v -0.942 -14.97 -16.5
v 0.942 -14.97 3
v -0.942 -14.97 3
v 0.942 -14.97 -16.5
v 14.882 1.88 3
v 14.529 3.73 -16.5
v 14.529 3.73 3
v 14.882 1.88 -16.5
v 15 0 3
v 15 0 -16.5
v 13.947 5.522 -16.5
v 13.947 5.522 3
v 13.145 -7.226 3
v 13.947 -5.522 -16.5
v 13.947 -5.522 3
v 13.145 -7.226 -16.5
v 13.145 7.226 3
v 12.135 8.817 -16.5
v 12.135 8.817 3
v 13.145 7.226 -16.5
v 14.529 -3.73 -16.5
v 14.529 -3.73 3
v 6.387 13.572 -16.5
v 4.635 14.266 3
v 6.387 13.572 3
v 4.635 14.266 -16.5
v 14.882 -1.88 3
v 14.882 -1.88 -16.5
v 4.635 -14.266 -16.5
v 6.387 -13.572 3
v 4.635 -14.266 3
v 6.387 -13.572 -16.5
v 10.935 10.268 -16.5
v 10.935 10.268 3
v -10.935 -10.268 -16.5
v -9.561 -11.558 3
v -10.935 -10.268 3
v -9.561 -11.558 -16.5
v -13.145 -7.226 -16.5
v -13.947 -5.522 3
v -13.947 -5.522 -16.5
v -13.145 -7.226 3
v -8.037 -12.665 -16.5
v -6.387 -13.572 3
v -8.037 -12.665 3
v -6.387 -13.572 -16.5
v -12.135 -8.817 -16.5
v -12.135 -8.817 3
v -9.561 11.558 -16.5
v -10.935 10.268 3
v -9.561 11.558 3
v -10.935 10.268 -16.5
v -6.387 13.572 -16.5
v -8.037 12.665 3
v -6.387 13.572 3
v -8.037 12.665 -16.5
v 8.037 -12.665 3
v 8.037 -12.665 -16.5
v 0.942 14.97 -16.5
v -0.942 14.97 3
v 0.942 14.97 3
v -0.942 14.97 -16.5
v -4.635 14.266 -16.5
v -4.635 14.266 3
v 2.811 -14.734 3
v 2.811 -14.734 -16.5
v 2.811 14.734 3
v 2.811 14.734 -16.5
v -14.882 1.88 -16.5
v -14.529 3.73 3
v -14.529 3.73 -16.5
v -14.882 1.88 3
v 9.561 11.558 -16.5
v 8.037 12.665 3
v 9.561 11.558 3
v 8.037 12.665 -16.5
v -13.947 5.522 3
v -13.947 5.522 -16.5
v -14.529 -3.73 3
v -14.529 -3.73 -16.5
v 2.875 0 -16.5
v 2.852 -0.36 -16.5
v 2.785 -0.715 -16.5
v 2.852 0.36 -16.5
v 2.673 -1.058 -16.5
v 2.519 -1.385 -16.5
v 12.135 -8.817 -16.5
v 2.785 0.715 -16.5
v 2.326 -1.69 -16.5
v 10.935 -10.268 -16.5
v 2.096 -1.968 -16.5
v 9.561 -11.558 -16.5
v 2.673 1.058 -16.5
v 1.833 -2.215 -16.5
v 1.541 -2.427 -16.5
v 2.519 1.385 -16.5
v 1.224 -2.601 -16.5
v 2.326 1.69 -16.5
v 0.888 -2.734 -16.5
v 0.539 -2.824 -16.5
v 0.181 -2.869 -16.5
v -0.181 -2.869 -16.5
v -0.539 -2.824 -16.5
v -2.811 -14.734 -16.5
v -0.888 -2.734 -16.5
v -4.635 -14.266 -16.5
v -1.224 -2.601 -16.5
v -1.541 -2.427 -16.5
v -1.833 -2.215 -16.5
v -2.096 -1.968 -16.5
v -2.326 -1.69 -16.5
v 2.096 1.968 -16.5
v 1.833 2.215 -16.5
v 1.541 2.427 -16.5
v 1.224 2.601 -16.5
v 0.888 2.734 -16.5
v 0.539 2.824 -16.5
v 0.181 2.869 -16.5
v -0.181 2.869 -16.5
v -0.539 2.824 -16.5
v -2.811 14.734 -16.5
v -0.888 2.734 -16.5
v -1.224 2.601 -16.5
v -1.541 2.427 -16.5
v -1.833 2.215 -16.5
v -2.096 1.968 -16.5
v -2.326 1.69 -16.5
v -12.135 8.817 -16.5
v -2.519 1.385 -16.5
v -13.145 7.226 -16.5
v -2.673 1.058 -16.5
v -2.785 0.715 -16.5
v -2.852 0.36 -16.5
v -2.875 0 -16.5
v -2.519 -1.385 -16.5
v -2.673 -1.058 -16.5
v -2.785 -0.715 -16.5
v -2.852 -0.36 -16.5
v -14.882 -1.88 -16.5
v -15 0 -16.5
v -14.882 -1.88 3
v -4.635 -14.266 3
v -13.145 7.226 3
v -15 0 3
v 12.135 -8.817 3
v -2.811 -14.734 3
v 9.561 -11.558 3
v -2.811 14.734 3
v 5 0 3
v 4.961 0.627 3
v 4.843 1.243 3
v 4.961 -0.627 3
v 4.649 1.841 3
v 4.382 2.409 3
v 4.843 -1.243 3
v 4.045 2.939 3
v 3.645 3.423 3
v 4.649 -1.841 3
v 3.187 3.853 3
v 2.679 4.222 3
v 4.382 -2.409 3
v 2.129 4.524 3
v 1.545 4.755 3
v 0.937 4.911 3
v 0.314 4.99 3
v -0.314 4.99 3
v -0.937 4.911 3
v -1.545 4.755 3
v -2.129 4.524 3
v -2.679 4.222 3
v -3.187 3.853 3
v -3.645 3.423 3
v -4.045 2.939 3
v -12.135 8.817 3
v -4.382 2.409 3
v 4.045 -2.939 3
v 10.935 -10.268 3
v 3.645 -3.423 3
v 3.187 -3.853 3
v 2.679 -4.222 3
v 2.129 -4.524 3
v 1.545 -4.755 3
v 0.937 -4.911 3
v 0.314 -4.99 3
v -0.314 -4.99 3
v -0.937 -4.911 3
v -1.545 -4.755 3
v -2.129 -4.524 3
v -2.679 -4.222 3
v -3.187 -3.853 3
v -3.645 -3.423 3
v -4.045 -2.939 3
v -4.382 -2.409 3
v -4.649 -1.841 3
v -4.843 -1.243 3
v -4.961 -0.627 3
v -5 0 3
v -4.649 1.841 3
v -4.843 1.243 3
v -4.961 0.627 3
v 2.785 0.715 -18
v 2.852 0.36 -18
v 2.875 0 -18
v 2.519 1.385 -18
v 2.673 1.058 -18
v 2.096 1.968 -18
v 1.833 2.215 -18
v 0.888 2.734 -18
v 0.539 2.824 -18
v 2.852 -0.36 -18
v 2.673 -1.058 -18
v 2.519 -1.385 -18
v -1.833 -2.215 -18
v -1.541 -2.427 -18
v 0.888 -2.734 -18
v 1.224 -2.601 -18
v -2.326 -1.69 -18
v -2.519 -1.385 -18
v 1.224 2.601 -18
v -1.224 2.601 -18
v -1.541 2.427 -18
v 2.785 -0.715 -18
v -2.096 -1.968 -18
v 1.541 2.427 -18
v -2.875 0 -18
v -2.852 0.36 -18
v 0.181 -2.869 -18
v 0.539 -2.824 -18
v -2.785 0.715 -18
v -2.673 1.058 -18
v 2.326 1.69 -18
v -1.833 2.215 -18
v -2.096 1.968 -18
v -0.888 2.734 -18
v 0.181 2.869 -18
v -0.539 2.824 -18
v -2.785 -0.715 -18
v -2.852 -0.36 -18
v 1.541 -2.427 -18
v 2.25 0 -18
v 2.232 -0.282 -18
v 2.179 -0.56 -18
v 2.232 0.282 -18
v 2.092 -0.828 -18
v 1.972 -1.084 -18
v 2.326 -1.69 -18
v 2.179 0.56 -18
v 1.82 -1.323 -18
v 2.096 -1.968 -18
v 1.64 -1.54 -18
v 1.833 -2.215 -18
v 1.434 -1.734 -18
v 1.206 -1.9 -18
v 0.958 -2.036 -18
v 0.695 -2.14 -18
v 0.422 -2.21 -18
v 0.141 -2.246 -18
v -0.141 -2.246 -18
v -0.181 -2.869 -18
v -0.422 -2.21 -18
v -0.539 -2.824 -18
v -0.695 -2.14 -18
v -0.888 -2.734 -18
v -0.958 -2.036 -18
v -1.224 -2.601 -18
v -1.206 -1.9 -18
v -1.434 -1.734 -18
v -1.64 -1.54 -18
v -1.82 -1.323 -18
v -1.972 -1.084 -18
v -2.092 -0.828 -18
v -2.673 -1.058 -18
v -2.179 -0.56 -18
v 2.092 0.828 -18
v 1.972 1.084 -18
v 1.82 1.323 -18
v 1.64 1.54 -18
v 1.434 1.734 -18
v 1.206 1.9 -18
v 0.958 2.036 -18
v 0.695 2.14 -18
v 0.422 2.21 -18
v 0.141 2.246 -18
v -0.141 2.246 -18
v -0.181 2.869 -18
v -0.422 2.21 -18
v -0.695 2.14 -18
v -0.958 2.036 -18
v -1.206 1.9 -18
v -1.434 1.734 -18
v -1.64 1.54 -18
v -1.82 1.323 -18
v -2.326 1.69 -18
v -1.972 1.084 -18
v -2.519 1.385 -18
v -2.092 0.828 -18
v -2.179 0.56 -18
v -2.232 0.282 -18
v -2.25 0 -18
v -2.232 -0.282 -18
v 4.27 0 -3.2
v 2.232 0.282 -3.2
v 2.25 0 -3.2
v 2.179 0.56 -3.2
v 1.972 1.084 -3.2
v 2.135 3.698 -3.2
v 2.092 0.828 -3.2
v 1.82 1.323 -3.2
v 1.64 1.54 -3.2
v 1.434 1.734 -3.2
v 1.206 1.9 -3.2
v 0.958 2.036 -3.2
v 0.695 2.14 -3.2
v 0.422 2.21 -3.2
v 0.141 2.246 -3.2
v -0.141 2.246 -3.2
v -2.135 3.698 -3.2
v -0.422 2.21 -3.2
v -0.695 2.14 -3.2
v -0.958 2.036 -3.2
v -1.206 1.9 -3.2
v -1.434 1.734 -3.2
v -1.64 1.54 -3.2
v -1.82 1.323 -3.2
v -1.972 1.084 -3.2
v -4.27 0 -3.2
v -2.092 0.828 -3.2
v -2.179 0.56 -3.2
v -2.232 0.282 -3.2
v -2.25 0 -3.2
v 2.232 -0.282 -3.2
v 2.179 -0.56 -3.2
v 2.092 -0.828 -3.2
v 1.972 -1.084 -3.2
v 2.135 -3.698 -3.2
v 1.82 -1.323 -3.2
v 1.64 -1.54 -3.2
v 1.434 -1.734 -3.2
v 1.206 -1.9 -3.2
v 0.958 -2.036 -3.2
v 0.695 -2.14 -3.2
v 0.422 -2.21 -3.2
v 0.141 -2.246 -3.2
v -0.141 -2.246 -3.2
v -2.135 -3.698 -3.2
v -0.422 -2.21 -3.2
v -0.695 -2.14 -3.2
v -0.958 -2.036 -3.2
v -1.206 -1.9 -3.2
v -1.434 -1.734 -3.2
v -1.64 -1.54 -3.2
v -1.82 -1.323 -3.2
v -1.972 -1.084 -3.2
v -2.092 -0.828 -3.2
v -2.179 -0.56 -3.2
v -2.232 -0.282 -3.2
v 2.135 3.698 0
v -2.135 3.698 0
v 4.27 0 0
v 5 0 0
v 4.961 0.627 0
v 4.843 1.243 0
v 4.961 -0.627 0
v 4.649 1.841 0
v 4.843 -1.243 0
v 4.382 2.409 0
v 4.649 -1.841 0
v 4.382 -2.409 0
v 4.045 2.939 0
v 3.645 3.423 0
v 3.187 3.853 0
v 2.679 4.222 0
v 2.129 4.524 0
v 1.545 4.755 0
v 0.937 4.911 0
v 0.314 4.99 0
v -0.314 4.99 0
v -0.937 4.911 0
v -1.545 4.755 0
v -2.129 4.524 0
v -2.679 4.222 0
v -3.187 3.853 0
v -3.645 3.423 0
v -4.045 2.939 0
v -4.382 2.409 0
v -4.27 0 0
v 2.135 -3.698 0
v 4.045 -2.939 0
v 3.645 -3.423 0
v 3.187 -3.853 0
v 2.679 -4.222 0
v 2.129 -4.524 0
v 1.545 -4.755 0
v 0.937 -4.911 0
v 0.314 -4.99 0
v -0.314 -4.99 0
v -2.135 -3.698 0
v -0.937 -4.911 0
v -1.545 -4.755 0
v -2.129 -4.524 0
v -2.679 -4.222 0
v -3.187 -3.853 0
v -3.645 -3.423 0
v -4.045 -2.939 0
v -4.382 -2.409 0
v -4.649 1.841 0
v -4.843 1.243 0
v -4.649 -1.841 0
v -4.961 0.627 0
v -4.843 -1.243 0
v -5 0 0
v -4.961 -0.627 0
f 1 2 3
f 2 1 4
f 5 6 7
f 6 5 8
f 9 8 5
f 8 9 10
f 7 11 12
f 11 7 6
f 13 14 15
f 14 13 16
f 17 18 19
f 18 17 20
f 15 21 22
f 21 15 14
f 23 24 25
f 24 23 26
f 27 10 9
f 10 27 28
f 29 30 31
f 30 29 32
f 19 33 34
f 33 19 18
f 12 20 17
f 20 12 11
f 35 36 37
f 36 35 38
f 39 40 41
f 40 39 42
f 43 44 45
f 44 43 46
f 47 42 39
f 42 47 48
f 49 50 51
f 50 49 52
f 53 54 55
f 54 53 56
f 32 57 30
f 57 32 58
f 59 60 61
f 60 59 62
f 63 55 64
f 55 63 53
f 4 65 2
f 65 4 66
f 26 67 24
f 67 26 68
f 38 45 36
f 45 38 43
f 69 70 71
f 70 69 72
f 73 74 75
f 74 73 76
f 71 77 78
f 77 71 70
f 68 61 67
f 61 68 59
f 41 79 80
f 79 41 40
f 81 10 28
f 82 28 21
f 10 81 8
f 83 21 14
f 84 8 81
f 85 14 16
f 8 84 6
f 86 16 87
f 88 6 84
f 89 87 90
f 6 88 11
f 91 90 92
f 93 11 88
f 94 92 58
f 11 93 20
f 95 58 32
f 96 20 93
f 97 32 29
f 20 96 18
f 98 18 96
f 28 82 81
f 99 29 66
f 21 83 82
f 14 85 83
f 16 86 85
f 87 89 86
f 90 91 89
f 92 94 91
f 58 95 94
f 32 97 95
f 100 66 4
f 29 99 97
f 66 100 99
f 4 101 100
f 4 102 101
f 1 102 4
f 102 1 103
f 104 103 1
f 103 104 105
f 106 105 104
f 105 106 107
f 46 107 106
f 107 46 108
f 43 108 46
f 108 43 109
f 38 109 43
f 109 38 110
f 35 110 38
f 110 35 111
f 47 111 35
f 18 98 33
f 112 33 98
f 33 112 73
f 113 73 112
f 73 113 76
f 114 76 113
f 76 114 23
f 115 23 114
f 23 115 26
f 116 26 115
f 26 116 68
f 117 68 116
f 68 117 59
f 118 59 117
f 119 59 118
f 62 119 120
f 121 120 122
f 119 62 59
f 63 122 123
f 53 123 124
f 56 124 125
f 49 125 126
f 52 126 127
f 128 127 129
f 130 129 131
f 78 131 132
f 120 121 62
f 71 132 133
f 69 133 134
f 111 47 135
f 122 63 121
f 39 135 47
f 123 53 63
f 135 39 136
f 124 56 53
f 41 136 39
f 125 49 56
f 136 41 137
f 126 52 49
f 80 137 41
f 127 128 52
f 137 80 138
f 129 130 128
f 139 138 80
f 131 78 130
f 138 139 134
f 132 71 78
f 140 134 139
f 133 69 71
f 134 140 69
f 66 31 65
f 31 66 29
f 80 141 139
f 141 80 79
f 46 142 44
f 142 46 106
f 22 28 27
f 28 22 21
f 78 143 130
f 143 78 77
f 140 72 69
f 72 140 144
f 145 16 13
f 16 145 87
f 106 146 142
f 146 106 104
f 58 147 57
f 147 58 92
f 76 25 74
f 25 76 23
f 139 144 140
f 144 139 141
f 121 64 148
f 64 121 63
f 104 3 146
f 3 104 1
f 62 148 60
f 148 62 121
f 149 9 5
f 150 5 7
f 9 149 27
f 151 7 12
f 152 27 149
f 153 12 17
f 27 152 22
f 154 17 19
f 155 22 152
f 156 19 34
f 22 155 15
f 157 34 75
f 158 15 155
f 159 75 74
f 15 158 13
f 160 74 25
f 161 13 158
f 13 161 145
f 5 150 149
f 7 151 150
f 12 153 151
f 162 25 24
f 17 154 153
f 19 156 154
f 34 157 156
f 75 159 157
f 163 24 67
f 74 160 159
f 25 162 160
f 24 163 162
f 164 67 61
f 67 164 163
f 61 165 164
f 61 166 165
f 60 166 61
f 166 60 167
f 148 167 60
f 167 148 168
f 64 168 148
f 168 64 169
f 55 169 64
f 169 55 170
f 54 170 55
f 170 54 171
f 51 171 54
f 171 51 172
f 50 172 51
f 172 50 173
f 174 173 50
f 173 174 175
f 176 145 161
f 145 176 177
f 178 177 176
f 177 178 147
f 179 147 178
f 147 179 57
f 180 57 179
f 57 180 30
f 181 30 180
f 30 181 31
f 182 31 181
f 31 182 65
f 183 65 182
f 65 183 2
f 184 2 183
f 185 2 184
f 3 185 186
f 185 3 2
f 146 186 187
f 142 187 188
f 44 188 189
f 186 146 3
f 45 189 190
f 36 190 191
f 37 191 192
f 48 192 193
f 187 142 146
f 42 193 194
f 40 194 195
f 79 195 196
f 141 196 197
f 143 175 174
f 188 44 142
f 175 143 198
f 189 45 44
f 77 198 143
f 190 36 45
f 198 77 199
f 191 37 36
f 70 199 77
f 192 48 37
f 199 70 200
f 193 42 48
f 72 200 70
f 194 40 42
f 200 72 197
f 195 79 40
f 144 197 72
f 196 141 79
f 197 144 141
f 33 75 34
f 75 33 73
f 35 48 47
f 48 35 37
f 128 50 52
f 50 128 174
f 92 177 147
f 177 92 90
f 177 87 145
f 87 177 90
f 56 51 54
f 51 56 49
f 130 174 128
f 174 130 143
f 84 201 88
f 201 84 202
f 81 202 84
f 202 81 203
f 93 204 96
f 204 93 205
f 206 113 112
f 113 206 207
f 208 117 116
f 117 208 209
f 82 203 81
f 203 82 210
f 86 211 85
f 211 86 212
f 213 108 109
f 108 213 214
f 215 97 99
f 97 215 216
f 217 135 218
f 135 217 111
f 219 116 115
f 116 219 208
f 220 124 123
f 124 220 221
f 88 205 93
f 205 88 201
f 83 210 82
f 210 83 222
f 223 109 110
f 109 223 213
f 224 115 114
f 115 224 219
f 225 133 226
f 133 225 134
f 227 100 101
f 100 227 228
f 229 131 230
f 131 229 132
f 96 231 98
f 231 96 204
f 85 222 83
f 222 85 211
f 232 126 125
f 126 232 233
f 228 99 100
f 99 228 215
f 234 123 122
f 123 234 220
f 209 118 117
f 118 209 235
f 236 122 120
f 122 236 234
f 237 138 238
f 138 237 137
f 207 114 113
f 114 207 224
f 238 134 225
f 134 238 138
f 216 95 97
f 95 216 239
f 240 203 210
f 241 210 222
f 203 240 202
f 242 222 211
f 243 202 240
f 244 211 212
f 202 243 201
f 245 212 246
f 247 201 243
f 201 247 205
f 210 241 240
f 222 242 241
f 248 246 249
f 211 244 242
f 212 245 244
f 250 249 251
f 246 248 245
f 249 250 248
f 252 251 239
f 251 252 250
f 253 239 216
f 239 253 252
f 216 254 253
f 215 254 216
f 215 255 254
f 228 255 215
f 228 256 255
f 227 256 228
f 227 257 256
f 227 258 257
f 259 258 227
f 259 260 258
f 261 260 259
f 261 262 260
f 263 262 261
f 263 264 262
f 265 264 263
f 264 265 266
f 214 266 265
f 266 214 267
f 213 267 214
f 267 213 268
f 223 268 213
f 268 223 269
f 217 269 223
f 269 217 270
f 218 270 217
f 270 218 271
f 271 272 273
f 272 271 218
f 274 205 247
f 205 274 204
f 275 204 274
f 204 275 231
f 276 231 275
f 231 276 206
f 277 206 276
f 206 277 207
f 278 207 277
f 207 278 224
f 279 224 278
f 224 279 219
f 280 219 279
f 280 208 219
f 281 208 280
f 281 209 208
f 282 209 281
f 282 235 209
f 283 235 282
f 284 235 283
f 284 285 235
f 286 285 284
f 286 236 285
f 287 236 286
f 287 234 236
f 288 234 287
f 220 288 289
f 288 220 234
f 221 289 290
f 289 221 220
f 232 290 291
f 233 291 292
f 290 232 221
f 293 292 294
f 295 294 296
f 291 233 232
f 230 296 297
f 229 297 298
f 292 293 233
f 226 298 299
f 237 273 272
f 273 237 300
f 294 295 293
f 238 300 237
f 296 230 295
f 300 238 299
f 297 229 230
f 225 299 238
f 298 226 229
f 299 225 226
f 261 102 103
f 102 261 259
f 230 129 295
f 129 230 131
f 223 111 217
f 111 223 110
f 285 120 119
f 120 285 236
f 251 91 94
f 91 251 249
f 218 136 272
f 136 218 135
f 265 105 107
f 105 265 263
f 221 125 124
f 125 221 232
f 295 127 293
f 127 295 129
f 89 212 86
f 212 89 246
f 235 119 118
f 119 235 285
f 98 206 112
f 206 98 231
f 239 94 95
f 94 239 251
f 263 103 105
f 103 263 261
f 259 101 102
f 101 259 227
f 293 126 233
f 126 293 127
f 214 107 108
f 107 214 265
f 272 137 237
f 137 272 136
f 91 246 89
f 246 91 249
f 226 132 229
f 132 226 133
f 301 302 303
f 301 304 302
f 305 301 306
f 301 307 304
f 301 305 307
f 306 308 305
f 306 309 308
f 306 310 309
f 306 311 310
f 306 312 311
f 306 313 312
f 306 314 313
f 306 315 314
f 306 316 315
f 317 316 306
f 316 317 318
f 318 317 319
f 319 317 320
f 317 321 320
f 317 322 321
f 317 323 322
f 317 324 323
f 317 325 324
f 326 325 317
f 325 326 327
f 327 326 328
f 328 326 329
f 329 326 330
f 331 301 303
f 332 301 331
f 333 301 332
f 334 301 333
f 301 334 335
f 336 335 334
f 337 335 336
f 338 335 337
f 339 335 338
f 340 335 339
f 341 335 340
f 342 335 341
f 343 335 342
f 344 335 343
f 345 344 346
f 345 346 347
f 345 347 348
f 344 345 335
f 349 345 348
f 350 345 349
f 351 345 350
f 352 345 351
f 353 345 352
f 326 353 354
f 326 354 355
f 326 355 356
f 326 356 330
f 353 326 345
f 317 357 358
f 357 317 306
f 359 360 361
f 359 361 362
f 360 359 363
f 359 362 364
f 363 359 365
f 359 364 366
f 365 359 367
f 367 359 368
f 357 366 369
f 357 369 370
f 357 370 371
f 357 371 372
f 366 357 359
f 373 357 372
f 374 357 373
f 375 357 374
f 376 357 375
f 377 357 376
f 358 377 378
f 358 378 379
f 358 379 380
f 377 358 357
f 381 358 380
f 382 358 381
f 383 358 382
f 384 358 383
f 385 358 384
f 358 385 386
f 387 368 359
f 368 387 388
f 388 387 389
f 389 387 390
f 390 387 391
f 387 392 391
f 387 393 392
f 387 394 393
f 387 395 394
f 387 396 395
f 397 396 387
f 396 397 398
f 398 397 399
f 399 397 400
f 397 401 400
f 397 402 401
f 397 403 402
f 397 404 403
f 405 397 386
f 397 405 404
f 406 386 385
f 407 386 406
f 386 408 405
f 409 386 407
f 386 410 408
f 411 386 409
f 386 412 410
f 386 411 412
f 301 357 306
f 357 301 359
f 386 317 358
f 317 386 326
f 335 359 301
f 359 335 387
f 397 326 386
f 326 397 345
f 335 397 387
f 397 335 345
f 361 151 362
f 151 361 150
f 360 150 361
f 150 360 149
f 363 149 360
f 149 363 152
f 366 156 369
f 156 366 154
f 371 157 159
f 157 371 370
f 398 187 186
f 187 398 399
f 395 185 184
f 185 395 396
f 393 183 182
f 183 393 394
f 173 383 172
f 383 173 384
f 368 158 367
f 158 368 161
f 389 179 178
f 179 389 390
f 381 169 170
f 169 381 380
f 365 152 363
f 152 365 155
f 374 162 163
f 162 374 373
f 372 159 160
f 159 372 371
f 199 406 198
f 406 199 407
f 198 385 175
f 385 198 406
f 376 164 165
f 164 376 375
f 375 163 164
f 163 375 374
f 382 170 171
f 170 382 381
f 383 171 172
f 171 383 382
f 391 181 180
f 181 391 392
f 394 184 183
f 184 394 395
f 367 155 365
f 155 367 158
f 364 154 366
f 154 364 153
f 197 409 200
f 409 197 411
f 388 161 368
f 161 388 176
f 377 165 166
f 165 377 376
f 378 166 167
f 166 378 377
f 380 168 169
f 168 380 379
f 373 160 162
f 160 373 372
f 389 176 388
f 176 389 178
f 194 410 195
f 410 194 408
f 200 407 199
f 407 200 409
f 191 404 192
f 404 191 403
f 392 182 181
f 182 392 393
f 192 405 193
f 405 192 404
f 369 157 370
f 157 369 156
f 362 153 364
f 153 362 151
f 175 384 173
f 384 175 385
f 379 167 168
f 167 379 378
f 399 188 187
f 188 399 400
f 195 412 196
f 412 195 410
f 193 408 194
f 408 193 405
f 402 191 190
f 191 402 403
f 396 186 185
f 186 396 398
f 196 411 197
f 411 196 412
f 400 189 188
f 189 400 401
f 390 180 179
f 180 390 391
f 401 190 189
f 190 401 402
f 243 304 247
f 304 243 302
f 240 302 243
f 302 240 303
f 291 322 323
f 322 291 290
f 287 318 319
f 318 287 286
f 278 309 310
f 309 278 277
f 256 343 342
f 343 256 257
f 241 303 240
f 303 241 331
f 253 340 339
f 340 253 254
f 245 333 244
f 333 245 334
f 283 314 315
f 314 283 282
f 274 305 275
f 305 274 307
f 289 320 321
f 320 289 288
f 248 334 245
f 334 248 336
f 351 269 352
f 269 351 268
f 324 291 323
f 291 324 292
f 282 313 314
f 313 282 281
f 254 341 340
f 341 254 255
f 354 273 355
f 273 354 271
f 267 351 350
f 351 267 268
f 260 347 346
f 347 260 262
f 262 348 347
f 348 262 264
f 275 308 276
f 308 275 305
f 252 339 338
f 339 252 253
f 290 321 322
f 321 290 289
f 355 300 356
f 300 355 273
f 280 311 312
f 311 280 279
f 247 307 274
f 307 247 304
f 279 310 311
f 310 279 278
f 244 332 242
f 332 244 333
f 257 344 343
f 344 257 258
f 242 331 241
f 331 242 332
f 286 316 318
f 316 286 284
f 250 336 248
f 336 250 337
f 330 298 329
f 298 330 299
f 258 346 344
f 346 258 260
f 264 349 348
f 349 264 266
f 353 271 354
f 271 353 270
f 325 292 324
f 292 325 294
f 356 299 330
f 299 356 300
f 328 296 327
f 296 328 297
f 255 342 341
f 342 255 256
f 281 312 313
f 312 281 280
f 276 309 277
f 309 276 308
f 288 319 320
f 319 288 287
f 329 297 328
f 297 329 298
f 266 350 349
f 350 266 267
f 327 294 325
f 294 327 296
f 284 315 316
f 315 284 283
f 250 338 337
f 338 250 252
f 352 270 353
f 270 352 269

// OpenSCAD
$fn = 50;

difference() {
	union() {
		translate(v = [0, 0, -16.5]) {
			cylinder(h = 19.5, r = 15.0);
		}
		#translate(v = [0, 0, -18.0]) {
			cylinder(h = 18, r = 2.875);
		}
	}
	union() {
		translate(v = [0, 0, 0]) {
			rotate(a = [0, 0, 0]) {
				difference() {
					union() {
						translate(v = [0, 0, -3.2]) {
							linear_extrude(height = 3.2) {
								polygon(points = [[4.2698, 0.0], [2.1349000000000005, 3.697755269078796], [-2.134899999999999, 3.6977552690787965], [-4.2698, 5.228996902999369e-16], [-2.134900000000002, -3.6977552690787956], [2.1348999999999974, -3.697755269078798]]);
							}
						}
					}
					union();
				}
			}
		}
		#cylinder(h = 3, r = 5.0);
		#translate(v = [0, 0, -100.0]) {
			cylinder(h = 200, r = 2.25);
		}
	}
}
